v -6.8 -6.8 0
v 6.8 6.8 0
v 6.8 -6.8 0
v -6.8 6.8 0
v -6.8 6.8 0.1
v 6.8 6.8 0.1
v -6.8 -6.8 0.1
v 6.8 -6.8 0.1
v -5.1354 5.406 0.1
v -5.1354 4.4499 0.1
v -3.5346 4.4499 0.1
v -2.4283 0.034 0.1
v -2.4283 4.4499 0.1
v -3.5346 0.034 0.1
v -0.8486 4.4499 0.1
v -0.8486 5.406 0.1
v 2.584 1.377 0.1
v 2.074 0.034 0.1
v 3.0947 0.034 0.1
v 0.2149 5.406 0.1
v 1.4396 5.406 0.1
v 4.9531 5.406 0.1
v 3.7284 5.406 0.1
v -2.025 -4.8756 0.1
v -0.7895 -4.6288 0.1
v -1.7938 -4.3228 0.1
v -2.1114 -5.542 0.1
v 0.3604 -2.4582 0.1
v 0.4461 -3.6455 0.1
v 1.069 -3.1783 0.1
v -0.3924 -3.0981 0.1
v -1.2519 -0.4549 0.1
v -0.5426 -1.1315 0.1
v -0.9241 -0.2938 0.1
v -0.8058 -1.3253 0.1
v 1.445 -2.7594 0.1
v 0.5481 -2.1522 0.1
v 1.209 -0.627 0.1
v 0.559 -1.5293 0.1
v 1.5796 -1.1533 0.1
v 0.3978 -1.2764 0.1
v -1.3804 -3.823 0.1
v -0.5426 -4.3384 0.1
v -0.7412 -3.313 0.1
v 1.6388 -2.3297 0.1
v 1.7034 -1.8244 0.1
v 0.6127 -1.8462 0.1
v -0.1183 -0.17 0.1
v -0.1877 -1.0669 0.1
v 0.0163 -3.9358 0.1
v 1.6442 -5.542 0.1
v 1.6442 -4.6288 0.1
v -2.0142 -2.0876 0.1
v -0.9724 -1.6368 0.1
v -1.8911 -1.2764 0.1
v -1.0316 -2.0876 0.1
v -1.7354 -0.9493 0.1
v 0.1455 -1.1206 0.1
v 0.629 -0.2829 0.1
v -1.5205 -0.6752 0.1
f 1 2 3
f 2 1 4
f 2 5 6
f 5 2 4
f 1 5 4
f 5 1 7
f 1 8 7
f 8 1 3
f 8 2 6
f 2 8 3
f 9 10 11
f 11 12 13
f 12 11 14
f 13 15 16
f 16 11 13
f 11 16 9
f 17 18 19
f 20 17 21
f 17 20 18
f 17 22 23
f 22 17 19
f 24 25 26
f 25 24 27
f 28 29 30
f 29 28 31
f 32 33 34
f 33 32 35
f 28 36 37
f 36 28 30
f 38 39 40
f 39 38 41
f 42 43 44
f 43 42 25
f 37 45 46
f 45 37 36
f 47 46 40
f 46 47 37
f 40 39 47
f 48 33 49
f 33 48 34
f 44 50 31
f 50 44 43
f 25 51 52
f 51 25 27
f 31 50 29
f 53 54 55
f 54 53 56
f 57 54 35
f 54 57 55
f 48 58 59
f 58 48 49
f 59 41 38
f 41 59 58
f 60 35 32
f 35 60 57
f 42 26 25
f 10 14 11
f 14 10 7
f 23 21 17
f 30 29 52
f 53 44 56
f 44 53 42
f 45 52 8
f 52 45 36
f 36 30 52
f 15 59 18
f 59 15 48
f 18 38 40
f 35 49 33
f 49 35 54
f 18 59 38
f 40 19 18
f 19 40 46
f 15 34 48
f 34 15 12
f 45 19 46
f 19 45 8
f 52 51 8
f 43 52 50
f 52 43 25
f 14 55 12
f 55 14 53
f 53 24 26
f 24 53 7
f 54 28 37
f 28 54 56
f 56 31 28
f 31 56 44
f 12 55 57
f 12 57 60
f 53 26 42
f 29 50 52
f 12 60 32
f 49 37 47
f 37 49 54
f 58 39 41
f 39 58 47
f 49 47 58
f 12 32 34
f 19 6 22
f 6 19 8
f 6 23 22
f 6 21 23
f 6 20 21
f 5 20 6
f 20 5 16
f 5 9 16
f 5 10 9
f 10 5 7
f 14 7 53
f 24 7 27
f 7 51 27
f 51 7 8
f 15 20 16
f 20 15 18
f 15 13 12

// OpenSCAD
// file: ../p/4-4edge.scad
use <../lib.scad>
$fa=1; $fs=0.2;
function ldraw_lib__4_4edge(realsolid=false) = [
// 0 Circle 1.0
// 0 Name: 4-4edge.dat
// 0 Author: James Jessiman
// 0 !LDRAW_ORG Primitive UPDATE 2017-01
// 0 !LICENSE Licensed under CC BY 2.0 and CC BY 4.0 : see CAreadme.txt
// 
// 0 BFC CERTIFY CCW
  [0,"BFC","CERTIFY"],
  [0,"BFC","CCW"],
// 
// 0 !HISTORY 1998-12-15 [PTadmin] Official Update 1998-10
// 0 !HISTORY 2005-12-28 [PTadmin] Official Update 2005-01
// 0 !HISTORY 2007-06-24 [PTadmin] Header formatted for Contributor Agreement
// 0 !HISTORY 2008-07-01 [PTadmin] Official Update 2008-01
// 0 !HISTORY 2017-01-15 [Steffen] BFCed
// 0 !HISTORY 2017-12-30 [PTadmin] Official Update 2017-01
// 
// 
// 2 24 1 0 0 0.9239 0 0.3827
  [2,24,1,0,0,0.9239,0,0.3827],
// 2 24 0.9239 0 0.3827 0.7071 0 0.7071
  [2,24,0.9239,0,0.3827,0.7071,0,0.7071],
// 2 24 0.7071 0 0.7071 0.3827 0 0.9239
  [2,24,0.7071,0,0.7071,0.3827,0,0.9239],
// 2 24 0.3827 0 0.9239 0 0 1
  [2,24,0.3827,0,0.9239,0,0,1],
// 2 24 0 0 1 -0.3827 0 0.9239
  [2,24,0,0,1,-0.3827,0,0.9239],
// 2 24 -0.3827 0 0.9239 -0.7071 0 0.7071
  [2,24,-0.3827,0,0.9239,-0.7071,0,0.7071],
// 2 24 -0.7071 0 0.7071 -0.9239 0 0.3827
  [2,24,-0.7071,0,0.7071,-0.9239,0,0.3827],
// 2 24 -0.9239 0 0.3827 -1 0 -0
  [2,24,-0.9239,0,0.3827,-1,0,-0],
// 2 24 -1 0 -0 -0.9239 0 -0.3827
  [2,24,-1,0,-0,-0.9239,0,-0.3827],
// 2 24 -0.9239 0 -0.3827 -0.7071 0 -0.7071
  [2,24,-0.9239,0,-0.3827,-0.7071,0,-0.7071],
// 2 24 -0.7071 0 -0.7071 -0.3827 0 -0.9239
  [2,24,-0.7071,0,-0.7071,-0.3827,0,-0.9239],
// 2 24 -0.3827 0 -0.9239 0 0 -1
  [2,24,-0.3827,0,-0.9239,0,0,-1],
// 2 24 0 0 -1 0.3827 0 -0.9239
  [2,24,0,0,-1,0.3827,0,-0.9239],
// 2 24 0.3827 0 -0.9239 0.7071 0 -0.7071
  [2,24,0.3827,0,-0.9239,0.7071,0,-0.7071],
// 2 24 0.7071 0 -0.7071 0.9239 0 -0.3827
  [2,24,0.7071,0,-0.7071,0.9239,0,-0.3827],
// 2 24 0.9239 0 -0.3827 1 0 0
  [2,24,0.9239,0,-0.3827,1,0,0],
];
module ldraw_lib__4_4edge(step=0, col=false, unit=2/5, alt=false, line=0.2, solid=!$preview)
    makepoly(ldraw_lib__4_4edge(solid), step=step, col=col, unit=unit, alt=alt, line=line, solid=solid);
ldraw_lib__4_4edge(line=0.2);
// file: ../p/4-4disc.scad
use <../lib.scad>
$fa=1; $fs=0.2;
function ldraw_lib__4_4disc(realsolid=false) = [
// 0 Disc 1.0
// 0 Name: 4-4disc.dat
// 0 Author: James Jessiman
// 0 !LDRAW_ORG Primitive UPDATE 2002-02
// 0 !LICENSE Licensed under CC BY 2.0 and CC BY 4.0 : see CAreadme.txt
// 
// 0 BFC CERTIFY CCW
  [0,"BFC","CERTIFY"],
  [0,"BFC","CCW"],
// 
// 0 !HISTORY 1998-12-15 [PTadmin] Official Update 1998-10
// 0 !HISTORY 2002-03-23 [sbliss] Added BFC statement
// 0 !HISTORY 2002-04-25 [PTadmin] Official Update 2002-02
// 0 !HISTORY 2007-06-24 [PTadmin] Header formatted for Contributor Agreement
// 0 !HISTORY 2008-07-01 [PTadmin] Official Update 2008-01
// 
// 
// 3 16 0 0 0 1 0 0 0.9239 0 0.3827
  [3,16,0,0,0,1,0,0,0.9239,0,0.3827],
// 3 16 0 0 0 0.9239 0 0.3827 0.7071 0 0.7071
  [3,16,0,0,0,0.9239,0,0.3827,0.7071,0,0.7071],
// 3 16 0 0 0 0.7071 0 0.7071 0.3827 0 0.9239
  [3,16,0,0,0,0.7071,0,0.7071,0.3827,0,0.9239],
// 3 16 0 0 0 0.3827 0 0.9239 0 0 1
  [3,16,0,0,0,0.3827,0,0.9239,0,0,1],
// 3 16 0 0 0 0 0 1 -0.3827 0 0.9239
  [3,16,0,0,0,0,0,1,-0.3827,0,0.9239],
// 3 16 0 0 0 -0.3827 0 0.9239 -0.7071 0 0.7071
  [3,16,0,0,0,-0.3827,0,0.9239,-0.7071,0,0.7071],
// 3 16 0 0 0 -0.7071 0 0.7071 -0.9239 0 0.3827
  [3,16,0,0,0,-0.7071,0,0.7071,-0.9239,0,0.3827],
// 3 16 0 0 0 -0.9239 0 0.3827 -1 0 -0
  [3,16,0,0,0,-0.9239,0,0.3827,-1,0,-0],
// 3 16 0 0 0 -1 0 -0 -0.9239 0 -0.3827
  [3,16,0,0,0,-1,0,-0,-0.9239,0,-0.3827],
// 3 16 0 0 0 -0.9239 0 -0.3827 -0.7071 0 -0.7071
  [3,16,0,0,0,-0.9239,0,-0.3827,-0.7071,0,-0.7071],
// 3 16 0 0 0 -0.7071 0 -0.7071 -0.3827 0 -0.9239
  [3,16,0,0,0,-0.7071,0,-0.7071,-0.3827,0,-0.9239],
// 3 16 0 0 0 -0.3827 0 -0.9239 0 0 -1
  [3,16,0,0,0,-0.3827,0,-0.9239,0,0,-1],
// 3 16 0 0 0 0 0 -1 0.3827 0 -0.9239
  [3,16,0,0,0,0,0,-1,0.3827,0,-0.9239],
// 3 16 0 0 0 0.3827 0 -0.9239 0.7071 0 -0.7071
  [3,16,0,0,0,0.3827,0,-0.9239,0.7071,0,-0.7071],
// 3 16 0 0 0 0.7071 0 -0.7071 0.9239 0 -0.3827
  [3,16,0,0,0,0.7071,0,-0.7071,0.9239,0,-0.3827],
// 3 16 0 0 0 0.9239 0 -0.3827 1 0 0
  [3,16,0,0,0,0.9239,0,-0.3827,1,0,0],
// 0
];
module ldraw_lib__4_4disc(step=0, col=false, unit=2/5, alt=false, line=0.2, solid=!$preview)
    makepoly(ldraw_lib__4_4disc(solid), step=step, col=col, unit=unit, alt=alt, line=line, solid=solid);
ldraw_lib__4_4disc(line=0.2);
// file: ../p/4-4cyli.scad
use <../lib.scad>
$fa=1; $fs=0.2;
function ldraw_lib__4_4cyli(realsolid=false) = [
// 0 Cylinder 1.0
// 0 Name: 4-4cyli.dat
// 0 Author: James Jessiman
// 0 !LDRAW_ORG Primitive UPDATE 2005-01
// 0 !LICENSE Licensed under CC BY 2.0 and CC BY 4.0 : see CAreadme.txt
// 
// 0 BFC CERTIFY CCW
  [0,"BFC","CERTIFY"],
  [0,"BFC","CCW"],
// 
// 0 !HISTORY 1998-12-15 [PTadmin] Official Update 1998-10
// 0 !HISTORY 2002-03-23 [sbliss] Added BFC statement; merged headers from files in distributions LDraw 0.27 and Complete.
// 0 !HISTORY 2002-04-25 [PTadmin] Official Update 2002-02
// 0 !HISTORY 2004-12-14 [guyvivan] BFC CCW
// 0 !HISTORY 2005-12-28 [PTadmin] Official Update 2005-01
// 0 !HISTORY 2007-06-24 [PTadmin] Header formatted for Contributor Agreement
// 0 !HISTORY 2008-07-01 [PTadmin] Official Update 2008-01
// 
// 
// 4 16 1 1 0 0.9239 1 0.3827 0.9239 0 0.3827 1 0 0
  [4,16,1,1,0,0.9239,1,0.3827,0.9239,0,0.3827,1,0,0],
// 5 24 1 0 0 1 1 0 0.9239 0 0.3827 0.9239 0 -0.3827
  [5,24,1,0,0,1,1,0,0.9239,0,0.3827,0.9239,0,-0.3827],
// 4 16 0.9239 1 0.3827 0.7071 1 0.7071 0.7071 0 0.7071 0.9239 0 0.3827
  [4,16,0.9239,1,0.3827,0.7071,1,0.7071,0.7071,0,0.7071,0.9239,0,0.3827],
// 5 24 0.9239 0 0.3827 0.9239 1 0.3827 0.7071 0 0.7071 1 0 0
  [5,24,0.9239,0,0.3827,0.9239,1,0.3827,0.7071,0,0.7071,1,0,0],
// 4 16 0.7071 1 0.7071 0.3827 1 0.9239 0.3827 0 0.9239 0.7071 0 0.7071
  [4,16,0.7071,1,0.7071,0.3827,1,0.9239,0.3827,0,0.9239,0.7071,0,0.7071],
// 5 24 0.7071 0 0.7071 0.7071 1 0.7071 0.3827 0 0.9239 0.9239 0 0.3827
  [5,24,0.7071,0,0.7071,0.7071,1,0.7071,0.3827,0,0.9239,0.9239,0,0.3827],
// 4 16 0.3827 1 0.9239 0 1 1 0 0 1 0.3827 0 0.9239
  [4,16,0.3827,1,0.9239,0,1,1,0,0,1,0.3827,0,0.9239],
// 5 24 0.3827 0 0.9239 0.3827 1 0.9239 0 0 1 0.7071 0 0.7071
  [5,24,0.3827,0,0.9239,0.3827,1,0.9239,0,0,1,0.7071,0,0.7071],
// 4 16 0 1 1 -0.3827 1 0.9239 -0.3827 0 0.9239 0 0 1
  [4,16,0,1,1,-0.3827,1,0.9239,-0.3827,0,0.9239,0,0,1],
// 5 24 0 0 1 0 1 1 -0.3827 0 0.9239 0.3827 0 0.9239
  [5,24,0,0,1,0,1,1,-0.3827,0,0.9239,0.3827,0,0.9239],
// 4 16 -0.3827 1 0.9239 -0.7071 1 0.7071 -0.7071 0 0.7071 -0.3827 0 0.9239
  [4,16,-0.3827,1,0.9239,-0.7071,1,0.7071,-0.7071,0,0.7071,-0.3827,0,0.9239],
// 5 24 -0.3827 0 0.9239 -0.3827 1 0.9239 -0.7071 0 0.7071 0 0 1
  [5,24,-0.3827,0,0.9239,-0.3827,1,0.9239,-0.7071,0,0.7071,0,0,1],
// 4 16 -0.7071 1 0.7071 -0.9239 1 0.3827 -0.9239 0 0.3827 -0.7071 0 0.7071
  [4,16,-0.7071,1,0.7071,-0.9239,1,0.3827,-0.9239,0,0.3827,-0.7071,0,0.7071],
// 5 24 -0.7071 0 0.7071 -0.7071 1 0.7071 -0.9239 0 0.3827 -0.3827 0 0.9239
  [5,24,-0.7071,0,0.7071,-0.7071,1,0.7071,-0.9239,0,0.3827,-0.3827,0,0.9239],
// 4 16 -0.9239 1 0.3827 -1 1 0 -1 0 0 -0.9239 0 0.3827
  [4,16,-0.9239,1,0.3827,-1,1,0,-1,0,0,-0.9239,0,0.3827],
// 5 24 -0.9239 0 0.3827 -0.9239 1 0.3827 -1 0 0 -0.7071 0 0.7071
  [5,24,-0.9239,0,0.3827,-0.9239,1,0.3827,-1,0,0,-0.7071,0,0.7071],
// 4 16 -1 1 0 -0.9239 1 -0.3827 -0.9239 0 -0.3827 -1 0 0
  [4,16,-1,1,0,-0.9239,1,-0.3827,-0.9239,0,-0.3827,-1,0,0],
// 5 24 -1 0 0 -1 1 0 -0.9239 0 -0.3827 -0.9239 0 0.3827
  [5,24,-1,0,0,-1,1,0,-0.9239,0,-0.3827,-0.9239,0,0.3827],
// 4 16 -0.9239 1 -0.3827 -0.7071 1 -0.7071 -0.7071 0 -0.7071 -0.9239 0 -0.3827
  [4,16,-0.9239,1,-0.3827,-0.7071,1,-0.7071,-0.7071,0,-0.7071,-0.9239,0,-0.3827],
// 5 24 -0.9239 0 -0.3827 -0.9239 1 -0.3827 -0.7071 0 -0.7071 -1 0 0
  [5,24,-0.9239,0,-0.3827,-0.9239,1,-0.3827,-0.7071,0,-0.7071,-1,0,0],
// 4 16 -0.7071 1 -0.7071 -0.3827 1 -0.9239 -0.3827 0 -0.9239 -0.7071 0 -0.7071
  [4,16,-0.7071,1,-0.7071,-0.3827,1,-0.9239,-0.3827,0,-0.9239,-0.7071,0,-0.7071],
// 5 24 -0.7071 0 -0.7071 -0.7071 1 -0.7071 -0.3827 0 -0.9239 -0.9239 0 -0.3827
  [5,24,-0.7071,0,-0.7071,-0.7071,1,-0.7071,-0.3827,0,-0.9239,-0.9239,0,-0.3827],
// 4 16 -0.3827 1 -0.9239 0 1 -1 0 0 -1 -0.3827 0 -0.9239
  [4,16,-0.3827,1,-0.9239,0,1,-1,0,0,-1,-0.3827,0,-0.9239],
// 5 24 -0.3827 0 -0.9239 -0.3827 1 -0.9239 0 0 -1 -0.7071 0 -0.7071
  [5,24,-0.3827,0,-0.9239,-0.3827,1,-0.9239,0,0,-1,-0.7071,0,-0.7071],
// 4 16 0 1 -1 0.3827 1 -0.9239 0.3827 0 -0.9239 0 0 -1
  [4,16,0,1,-1,0.3827,1,-0.9239,0.3827,0,-0.9239,0,0,-1],
// 5 24 0 0 -1 0 1 -1 0.3827 0 -0.9239 -0.3827 0 -0.9239
  [5,24,0,0,-1,0,1,-1,0.3827,0,-0.9239,-0.3827,0,-0.9239],
// 4 16 0.3827 1 -0.9239 0.7071 1 -0.7071 0.7071 0 -0.7071 0.3827 0 -0.9239
  [4,16,0.3827,1,-0.9239,0.7071,1,-0.7071,0.7071,0,-0.7071,0.3827,0,-0.9239],
// 5 24 0.3827 0 -0.9239 0.3827 1 -0.9239 0.7071 0 -0.7071 0 0 -1
  [5,24,0.3827,0,-0.9239,0.3827,1,-0.9239,0.7071,0,-0.7071,0,0,-1],
// 4 16 0.7071 1 -0.7071 0.9239 1 -0.3827 0.9239 0 -0.3827 0.7071 0 -0.7071
  [4,16,0.7071,1,-0.7071,0.9239,1,-0.3827,0.9239,0,-0.3827,0.7071,0,-0.7071],
// 5 24 0.7071 0 -0.7071 0.7071 1 -0.7071 0.9239 0 -0.3827 0.3827 0 -0.9239
  [5,24,0.7071,0,-0.7071,0.7071,1,-0.7071,0.9239,0,-0.3827,0.3827,0,-0.9239],
// 4 16 0.9239 1 -0.3827 1 1 0 1 0 0 0.9239 0 -0.3827
  [4,16,0.9239,1,-0.3827,1,1,0,1,0,0,0.9239,0,-0.3827],
// 5 24 0.9239 0 -0.3827 0.9239 1 -0.3827 1 0 0 0.7071 0 -0.7071
  [5,24,0.9239,0,-0.3827,0.9239,1,-0.3827,1,0,0,0.7071,0,-0.7071],
// 0
];
module ldraw_lib__4_4cyli(step=0, col=false, unit=2/5, alt=false, line=0.2, solid=!$preview)
    makepoly(ldraw_lib__4_4cyli(solid), step=step, col=col, unit=unit, alt=alt, line=line, solid=solid);
ldraw_lib__4_4cyli(line=0.2);
// file: ../p/stud3.scad
use <../lib.scad>
use <4-4cyli.scad>
use <4-4disc.scad>
use <4-4edge.scad>
$fa=1; $fs=0.2;
function ldraw_lib__stud3(realsolid=false) = realsolid ? 
    [openscad(translate([0,0,-eps()], o=cylinder(4+eps(), r=4)),2)] : [
// 0 Stud Tube Solid
// 0 Name: stud3.dat
// 0 Author: James Jessiman
// 0 !LDRAW_ORG Primitive UPDATE 2012-01
// 0 !LICENSE Licensed under CC BY 2.0 and CC BY 4.0 : see CAreadme.txt
// 
// 0 BFC CERTIFY CCW
  [0,"BFC","CERTIFY"],
  [0,"BFC","CCW"],
// 
// 0 !HISTORY 2002-04-04 [sbliss] Modified for BFC compliance
// 0 !HISTORY 2002-04-25 [PTadmin] Official Update 2002-02
// 0 !HISTORY 2007-06-24 [PTadmin] Header formatted for Contributor Agreement
// 0 !HISTORY 2008-07-01 [PTadmin] Official Update 2008-01
// 0 !HISTORY 2012-02-16 [Philo] Changed to CCW
// 0 !HISTORY 2012-03-30 [PTadmin] Official Update 2012-01
// 
// 
// 1 16 0 -4 0 4 0 0 0 1 0 0 0 4 4-4edge.dat
  [1,16,0,-4,0,4,0,0,0,1,0,0,0,4, ldraw_lib__4_4edge(realsolid)],
// 1 16 0 0 0 4 0 0 0 1 0 0 0 4 4-4edge.dat
  [1,16,0,0,0,4,0,0,0,1,0,0,0,4, ldraw_lib__4_4edge(realsolid)],
// 1 16 0 -4 0 4 0 0 0 1 0 0 0 4 4-4disc.dat
  [1,16,0,-4,0,4,0,0,0,1,0,0,0,4, ldraw_lib__4_4disc(realsolid)],
// 1 16 0 -4 0 4 0 0 0 4 0 0 0 4 4-4cyli.dat
  [1,16,0,-4,0,4,0,0,0,4,0,0,0,4, ldraw_lib__4_4cyli(realsolid)],
];
module ldraw_lib__stud3(step=0, col=false, unit=2/5, alt=false, line=0.2, solid=!$preview)
    makepoly(ldraw_lib__stud3(solid), step=step, col=col, unit=unit, alt=alt, line=line, solid=solid);
ldraw_lib__stud3(line=0.2);
// file: ../p/stud.scad
use <../lib.scad>
use <4-4cyli.scad>
use <4-4disc.scad>
use <4-4edge.scad>
$fa=1; $fs=0.2;
function ldraw_lib__stud(realsolid=false) = realsolid ? 
    [openscad(translate([0,0,-eps()], o=cylinder(4+eps(), r=6)),2)] : [
// 0 Stud
// 0 Name: stud.dat
// 0 Author: James Jessiman
// 0 !LDRAW_ORG Primitive UPDATE 2012-01
// 0 !LICENSE Licensed under CC BY 2.0 and CC BY 4.0 : see CAreadme.txt
// 
// 0 BFC CERTIFY CCW
  [0,"BFC","CERTIFY"],
  [0,"BFC","CCW"],
// 
// 0 !HISTORY 2002-04-04 [sbliss] Modified for BFC compliance
// 0 !HISTORY 2002-04-25 [PTadmin] Official Update 2002-02
// 0 !HISTORY 2007-06-24 [PTadmin] Header formatted for Contributor Agreement
// 0 !HISTORY 2008-07-01 [PTadmin] Official Update 2008-01
// 0 !HISTORY 2012-02-16 [Philo] Changed to CCW
// 0 !HISTORY 2012-03-30 [PTadmin] Official Update 2012-01
// 
// 
// 1 16 0 0 0 6 0 0 0 1 0 0 0 6 4-4edge.dat
  [1,16,0,0,0,6,0,0,0,1,0,0,0,6, ldraw_lib__4_4edge(realsolid)],
// 1 16 0 -4 0 6 0 0 0 1 0 0 0 6 4-4edge.dat
  [1,16,0,-4,0,6,0,0,0,1,0,0,0,6, ldraw_lib__4_4edge(realsolid)],
// 1 16 0 0 0 6 0 0 0 -4 0 0 0 6 4-4cyli.dat
  [1,16,0,0,0,6,0,0,0,-4,0,0,0,6, ldraw_lib__4_4cyli(realsolid)],
// 1 16 0 -4 0 6 0 0 0 1 0 0 0 6 4-4disc.dat
  [1,16,0,-4,0,6,0,0,0,1,0,0,0,6, ldraw_lib__4_4disc(realsolid)],
];
module ldraw_lib__stud(step=0, col=false, unit=2/5, alt=false, line=0.2, solid=!$preview)
    makepoly(ldraw_lib__stud(solid), step=step, col=col, unit=unit, alt=alt, line=line, solid=solid);
ldraw_lib__stud(line=0.2);
// file: ../p/box5.scad
use <../lib.scad>
$fa=1; $fs=0.2;
function ldraw_lib__box5(realsolid=false) = [
// 0 Box with 5 Faces and All Edges
// 0 Name: box5.dat
// 0 Author: James Jessiman
// 0 !LDRAW_ORG Primitive UPDATE 2012-01
// 0 !LICENSE Licensed under CC BY 2.0 and CC BY 4.0 : see CAreadme.txt
// 
// 0 BFC CERTIFY CCW
  [0,"BFC","CERTIFY"],
  [0,"BFC","CCW"],
// 
// 0 !HISTORY 2002-04-03 [sbliss] Modified for BFC compliance
// 0 !HISTORY 2002-04-25 [PTadmin] Official Update 2002-02
// 0 !HISTORY 2007-06-24 [PTadmin] Header formatted for Contributor Agreement
// 0 !HISTORY 2008-07-01 [PTadmin] Official Update 2008-01
// 0 !HISTORY 2012-02-16 [Philo] Changed to CCW
// 0 !HISTORY 2012-03-30 [PTadmin] Official Update 2012-01
// 
// 
// 2 24 1 1 1 -1 1 1
  [2,24,1,1,1,-1,1,1],
// 2 24 -1 1 1 -1 1 -1
  [2,24,-1,1,1,-1,1,-1],
// 2 24 -1 1 -1 1 1 -1
  [2,24,-1,1,-1,1,1,-1],
// 2 24 1 1 -1 1 1 1
  [2,24,1,1,-1,1,1,1],
// 2 24 1 0 1 -1 0 1
  [2,24,1,0,1,-1,0,1],
// 2 24 -1 0 1 -1 0 -1
  [2,24,-1,0,1,-1,0,-1],
// 2 24 -1 0 -1 1 0 -1
  [2,24,-1,0,-1,1,0,-1],
// 2 24 1 0 -1 1 0 1
  [2,24,1,0,-1,1,0,1],
// 2 24 1 0 1 1 1 1
  [2,24,1,0,1,1,1,1],
// 2 24 -1 0 1 -1 1 1
  [2,24,-1,0,1,-1,1,1],
// 2 24 1 0 -1 1 1 -1
  [2,24,1,0,-1,1,1,-1],
// 2 24 -1 0 -1 -1 1 -1
  [2,24,-1,0,-1,-1,1,-1],
// 4 16 -1 1 1 1 1 1 1 1 -1 -1 1 -1
  [4,16,-1,1,1,1,1,1,1,1,-1,-1,1,-1],
// 4 16 -1 1 1 -1 0 1 1 0 1 1 1 1
  [4,16,-1,1,1,-1,0,1,1,0,1,1,1,1],
// 4 16 -1 1 -1 -1 0 -1 -1 0 1 -1 1 1
  [4,16,-1,1,-1,-1,0,-1,-1,0,1,-1,1,1],
// 4 16 1 1 -1 1 0 -1 -1 0 -1 -1 1 -1
  [4,16,1,1,-1,1,0,-1,-1,0,-1,-1,1,-1],
// 4 16 1 1 1 1 0 1 1 0 -1 1 1 -1
  [4,16,1,1,1,1,0,1,1,0,-1,1,1,-1],
];
module ldraw_lib__box5(step=0, col=false, unit=2/5, alt=false, line=0.2, solid=!$preview)
    makepoly(ldraw_lib__box5(solid), step=step, col=col, unit=unit, alt=alt, line=line, solid=solid);
ldraw_lib__box5(line=0.2);
// file: ../p/box4t.scad
use <../lib.scad>
$fa=1; $fs=0.2;
function ldraw_lib__box4t(realsolid=false) = [
// 0 Box with 4 Adjacent Faces and All Edges
// 0 Name: box4t.dat
// 0 Author: Tore Eriksson [Tore_Eriksson]
// 0 !LDRAW_ORG Primitive UPDATE 2003-02
// 0 !LICENSE Licensed under CC BY 2.0 and CC BY 4.0 : see CAreadme.txt
// 
// 0 BFC CERTIFY CCW
  [0,"BFC","CERTIFY"],
  [0,"BFC","CCW"],
// 
// 0 !HISTORY 1997-09-29 [PTadmin] Official Update 1997-15
// 0 !HISTORY 2002-08-31 [izanette] Modified with WINDZ for BFC compliance
// 0 !HISTORY 2003-08-01 [PTadmin] Official Update 2003-02
// 0 !HISTORY 2007-06-24 [PTadmin] Header formatted for Contributor Agreement
// 0 !HISTORY 2008-07-01 [PTadmin] Official Update 2008-01
// 
// 
// 2 24 1 1 1 -1 1 1
  [2,24,1,1,1,-1,1,1],
// 2 24 -1 1 1 -1 1 -1
  [2,24,-1,1,1,-1,1,-1],
// 2 24 -1 1 -1 1 1 -1
  [2,24,-1,1,-1,1,1,-1],
// 2 24 1 1 -1 1 1 1
  [2,24,1,1,-1,1,1,1],
// 2 24 1 0 1 -1 0 1
  [2,24,1,0,1,-1,0,1],
// 2 24 -1 0 1 -1 0 -1
  [2,24,-1,0,1,-1,0,-1],
// 2 24 -1 0 -1 1 0 -1
  [2,24,-1,0,-1,1,0,-1],
// 2 24 1 0 -1 1 0 1
  [2,24,1,0,-1,1,0,1],
// 2 24 1 0 1 1 1 1
  [2,24,1,0,1,1,1,1],
// 2 24 -1 0 1 -1 1 1
  [2,24,-1,0,1,-1,1,1],
// 2 24 1 0 -1 1 1 -1
  [2,24,1,0,-1,1,1,-1],
// 2 24 -1 0 -1 -1 1 -1
  [2,24,-1,0,-1,-1,1,-1],
// 4 16 1 1 1 1 1 -1 -1 1 -1 -1 1 1
  [4,16,1,1,1,1,1,-1,-1,1,-1,-1,1,1],
// 4 16 1 1 1 -1 1 1 -1 0 1 1 0 1
  [4,16,1,1,1,-1,1,1,-1,0,1,1,0,1],
// 4 16 -1 1 1 -1 1 -1 -1 0 -1 -1 0 1
  [4,16,-1,1,1,-1,1,-1,-1,0,-1,-1,0,1],
// 0 4 16 -1 1 -1 -1 0 -1 1 0 -1 1 1 -1
// 4 16 1 1 -1 1 1 1 1 0 1 1 0 -1
  [4,16,1,1,-1,1,1,1,1,0,1,1,0,-1],
// 0
];
module ldraw_lib__box4t(step=0, col=false, unit=2/5, alt=false, line=0.2, solid=!$preview)
    makepoly(ldraw_lib__box4t(solid), step=step, col=col, unit=unit, alt=alt, line=line, solid=solid);
ldraw_lib__box4t(line=0.2);
// file: s/3004s01.scad
use <../../lib.scad>
use <../../p/box4t.scad>
use <../../p/box5.scad>
use <../../p/stud.scad>
use <../../p/stud3.scad>
$fa=1; $fs=0.2;
function ldraw_lib__s__3004s01(realsolid=false) = [
// 0 ~Brick  1 x  2 without Front Face
// 0 Name: s\3004s01.dat
// 0 Author: James Jessiman
// 0 !LDRAW_ORG Subpart UPDATE 2003-03
// 0 !LICENSE Licensed under CC BY 2.0 and CC BY 4.0 : see CAreadme.txt
// 
// 0 BFC CERTIFY CCW
  [0,"BFC","CERTIFY"],
  [0,"BFC","CCW"],
// 
// 0 !HISTORY 2003-09-07 [jriley] Subfiling, BFC
// 0 !HISTORY 2003-12-19 [PTadmin] Official Update 2003-03
// 0 !HISTORY 2007-08-29 [PTadmin] Header formatted for Contributor Agreement
// 0 !HISTORY 2008-07-01 [PTadmin] Official Update 2008-01
// 
// 
// 1 16 0 4 0 1 0 0 0 -5 0 0 0 1 stud3.dat
  [1,16,0,4,0,1,0,0,0,-5,0,0,0,1, ldraw_lib__stud3(realsolid)],
// 0 BFC INVERTNEXT
  [0,"BFC","INVERTNEXT"],
// 1 16 0 24 0 16 0 0 0 -20 0 0 0 6 box5.dat
  [1,16,0,24,0,16,0,0,0,-20,0,0,0,6, ldraw_lib__box5(realsolid)],
// 4 16 20 24 10 16 24 6 -16 24 6 -20 24 10
  [4,16,20,24,10,16,24,6,-16,24,6,-20,24,10],
// 4 16 -20 24 10 -16 24 6 -16 24 -6 -20 24 -10
  [4,16,-20,24,10,-16,24,6,-16,24,-6,-20,24,-10],
// 4 16 -20 24 -10 -16 24 -6 16 24 -6 20 24 -10
  [4,16,-20,24,-10,-16,24,-6,16,24,-6,20,24,-10],
// 4 16 20 24 -10 16 24 -6 16 24 6 20 24 10
  [4,16,20,24,-10,16,24,-6,16,24,6,20,24,10],
// 1 16 0 24 0 20 0 0 0 -24 0 0 0 10 box4t.dat
  [1,16,0,24,0,20,0,0,0,-24,0,0,0,10, ldraw_lib__box4t(realsolid)],
// 1 16 10 0 0 1 0 0 0 1 0 0 0 1 stud.dat
  [1,16,10,0,0,1,0,0,0,1,0,0,0,1, ldraw_lib__stud(realsolid)],
// 1 16 -10 0 0 1 0 0 0 1 0 0 0 1 stud.dat
  [1,16,-10,0,0,1,0,0,0,1,0,0,0,1, ldraw_lib__stud(realsolid)],
// 0
];
module ldraw_lib__s__3004s01(step=0, col=false, unit=2/5, alt=false, line=0.2, solid=!$preview)
    makepoly(ldraw_lib__s__3004s01(solid), step=step, col=col, unit=unit, alt=alt, line=line, solid=solid);
ldraw_lib__s__3004s01(line=0.2);
// file: 3004.scad
use <../lib.scad>
use <s/3004s01.scad>
$fa=1; $fs=0.2;
function ldraw_lib__3004(realsolid=false) = [
// 0 Brick  1 x  2
// 0 Name: 3004.dat
// 0 Author: James Jessiman
// 0 !LDRAW_ORG Part UPDATE 2022-05
// 0 !LICENSE Licensed under CC BY 2.0 and CC BY 4.0 : see CAreadme.txt
// 
// 0 BFC CERTIFY CCW
  [0,"BFC","CERTIFY"],
  [0,"BFC","CCW"],
// 
// 0 !HISTORY 2001-10-26 [PTadmin] Official Update 2001-01
// 0 !HISTORY 2002-05-07 {unknown} BFC Certification
// 0 !HISTORY 2002-06-11 [PTadmin] Official Update 2002-03
// 0 !HISTORY 2007-05-07 [PTadmin] Header formatted for Contributor Agreement
// 0 !HISTORY 2008-07-01 [PTadmin] Official Update 2008-01
// 0 !HISTORY 2022-08-04 [MagFors] Using subfile
// 0 !HISTORY 2022-09-15 [PTadmin] Official Update 2022-05
// 
// 
// 1 16 0 0 0 1 0 0 0 1 0 0 0 1 s\3004s01.dat
  [1,16,0,0,0,1,0,0,0,1,0,0,0,1, ldraw_lib__s__3004s01(realsolid)],
// 4 16 -20 24 -10 20 24 -10 20 0 -10 -20 0 -10
  [4,16,-20,24,-10,20,24,-10,20,0,-10,-20,0,-10],
];
module ldraw_lib__3004(step=0, col=false, unit=2/5, alt=false, line=0.2, solid=!$preview)
    makepoly(ldraw_lib__3004(solid), step=step, col=col, unit=unit, alt=alt, line=line, solid=solid);
ldraw_lib__3004(line=0.2);
// file: ../p/box5-12.scad
use <../lib.scad>
$fa=1; $fs=0.2;
function ldraw_lib__box5_12(realsolid=false) = [
// 0 Box with 5 Faces without Any Edges
// 0 Name: box5-12.dat
// 0 Author: Chris Dee [cwdee]
// 0 !LDRAW_ORG Primitive UPDATE 2009-02
// 0 !LICENSE Licensed under CC BY 2.0 and CC BY 4.0 : see CAreadme.txt
// 
// 0 BFC CERTIFY CCW
  [0,"BFC","CERTIFY"],
  [0,"BFC","CCW"],
// 
// 0 !HISTORY 2009-09-03 [PTadmin] Official Update 2009-02
// 
// 
// 4 16 1 1 1 1 1 -1 -1 1 -1 -1 1 1
  [4,16,1,1,1,1,1,-1,-1,1,-1,-1,1,1],
// 4 16 -1 0 1 1 0 1 1 1 1 -1 1 1
  [4,16,-1,0,1,1,0,1,1,1,1,-1,1,1],
// 4 16 -1 0 -1 -1 0 1 -1 1 1 -1 1 -1
  [4,16,-1,0,-1,-1,0,1,-1,1,1,-1,1,-1],
// 4 16 1 0 -1 -1 0 -1 -1 1 -1 1 1 -1
  [4,16,1,0,-1,-1,0,-1,-1,1,-1,1,1,-1],
// 4 16 1 0 1 1 0 -1 1 1 -1 1 1 1
  [4,16,1,0,1,1,0,-1,1,1,-1,1,1,1],
// 0
];
module ldraw_lib__box5_12(step=0, col=false, unit=2/5, alt=false, line=0.2, solid=!$preview)
    makepoly(ldraw_lib__box5_12(solid), step=step, col=col, unit=unit, alt=alt, line=line, solid=solid);
ldraw_lib__box5_12(line=0.2);
// main file
use <../lib.scad>
use <../p/box5-12.scad>
use <s/003672bs01.scad>
$fa=1; $fs=0.2;
function ldraw_lib__003672a(realsolid=false) = [
// 0 Sticker  1.7 x  1.7 with White "TV2" on Blue Background
// 0 Name: 003672a.dat
// 0 Author: Willy Tschager [Holly-Wood]
// 0 !LDRAW_ORG Part UPDATE 2022-04
// 0 !LICENSE Licensed under CC BY 2.0 and CC BY 4.0 : see CAreadme.txt
// 
// 0 BFC CERTIFY CCW
  [0,"BFC","CERTIFY"],
  [0,"BFC","CCW"],
// 
// 0 !KEYWORDS Bricklink 664stk01, Brickowl 560716, camera, legoland
// 0 !KEYWORDS Rebrickable 3672, set 664, television, van
// 
// 0 !HISTORY 2022-07-18 [PTadmin] Official Update 2022-04
// 
// 
// 0 // Small Box
// 
// 1 16 0 -0.25 0 17 0 0 0 0.25 0 0 0 17 box5-12.dat
  [1,16,0,-0.25,0,17,0,0,0,0.25,0,0,0,17, ldraw_lib__box5_12(realsolid)],
// 
// 0 // www.holly-wood.it
// 
// 0 // Pattern Subpart
// 1 16 0 0 0 1.7 0 0 0 1 0 0 0 1.7 s\003672bs01.dat
  [1,16,0,0,0,1.7,0,0,0,1,0,0,0,1.7, ldraw_lib__s__003672bs01(realsolid)],
];
module ldraw_lib__003672a(step=0, col=false, unit=2/5, alt=false, line=0.2, solid=!$preview)
    makepoly(ldraw_lib__003672a(solid), step=step, col=col, unit=unit, alt=alt, line=line, solid=solid);
ldraw_lib__003672a(line=0.2);
